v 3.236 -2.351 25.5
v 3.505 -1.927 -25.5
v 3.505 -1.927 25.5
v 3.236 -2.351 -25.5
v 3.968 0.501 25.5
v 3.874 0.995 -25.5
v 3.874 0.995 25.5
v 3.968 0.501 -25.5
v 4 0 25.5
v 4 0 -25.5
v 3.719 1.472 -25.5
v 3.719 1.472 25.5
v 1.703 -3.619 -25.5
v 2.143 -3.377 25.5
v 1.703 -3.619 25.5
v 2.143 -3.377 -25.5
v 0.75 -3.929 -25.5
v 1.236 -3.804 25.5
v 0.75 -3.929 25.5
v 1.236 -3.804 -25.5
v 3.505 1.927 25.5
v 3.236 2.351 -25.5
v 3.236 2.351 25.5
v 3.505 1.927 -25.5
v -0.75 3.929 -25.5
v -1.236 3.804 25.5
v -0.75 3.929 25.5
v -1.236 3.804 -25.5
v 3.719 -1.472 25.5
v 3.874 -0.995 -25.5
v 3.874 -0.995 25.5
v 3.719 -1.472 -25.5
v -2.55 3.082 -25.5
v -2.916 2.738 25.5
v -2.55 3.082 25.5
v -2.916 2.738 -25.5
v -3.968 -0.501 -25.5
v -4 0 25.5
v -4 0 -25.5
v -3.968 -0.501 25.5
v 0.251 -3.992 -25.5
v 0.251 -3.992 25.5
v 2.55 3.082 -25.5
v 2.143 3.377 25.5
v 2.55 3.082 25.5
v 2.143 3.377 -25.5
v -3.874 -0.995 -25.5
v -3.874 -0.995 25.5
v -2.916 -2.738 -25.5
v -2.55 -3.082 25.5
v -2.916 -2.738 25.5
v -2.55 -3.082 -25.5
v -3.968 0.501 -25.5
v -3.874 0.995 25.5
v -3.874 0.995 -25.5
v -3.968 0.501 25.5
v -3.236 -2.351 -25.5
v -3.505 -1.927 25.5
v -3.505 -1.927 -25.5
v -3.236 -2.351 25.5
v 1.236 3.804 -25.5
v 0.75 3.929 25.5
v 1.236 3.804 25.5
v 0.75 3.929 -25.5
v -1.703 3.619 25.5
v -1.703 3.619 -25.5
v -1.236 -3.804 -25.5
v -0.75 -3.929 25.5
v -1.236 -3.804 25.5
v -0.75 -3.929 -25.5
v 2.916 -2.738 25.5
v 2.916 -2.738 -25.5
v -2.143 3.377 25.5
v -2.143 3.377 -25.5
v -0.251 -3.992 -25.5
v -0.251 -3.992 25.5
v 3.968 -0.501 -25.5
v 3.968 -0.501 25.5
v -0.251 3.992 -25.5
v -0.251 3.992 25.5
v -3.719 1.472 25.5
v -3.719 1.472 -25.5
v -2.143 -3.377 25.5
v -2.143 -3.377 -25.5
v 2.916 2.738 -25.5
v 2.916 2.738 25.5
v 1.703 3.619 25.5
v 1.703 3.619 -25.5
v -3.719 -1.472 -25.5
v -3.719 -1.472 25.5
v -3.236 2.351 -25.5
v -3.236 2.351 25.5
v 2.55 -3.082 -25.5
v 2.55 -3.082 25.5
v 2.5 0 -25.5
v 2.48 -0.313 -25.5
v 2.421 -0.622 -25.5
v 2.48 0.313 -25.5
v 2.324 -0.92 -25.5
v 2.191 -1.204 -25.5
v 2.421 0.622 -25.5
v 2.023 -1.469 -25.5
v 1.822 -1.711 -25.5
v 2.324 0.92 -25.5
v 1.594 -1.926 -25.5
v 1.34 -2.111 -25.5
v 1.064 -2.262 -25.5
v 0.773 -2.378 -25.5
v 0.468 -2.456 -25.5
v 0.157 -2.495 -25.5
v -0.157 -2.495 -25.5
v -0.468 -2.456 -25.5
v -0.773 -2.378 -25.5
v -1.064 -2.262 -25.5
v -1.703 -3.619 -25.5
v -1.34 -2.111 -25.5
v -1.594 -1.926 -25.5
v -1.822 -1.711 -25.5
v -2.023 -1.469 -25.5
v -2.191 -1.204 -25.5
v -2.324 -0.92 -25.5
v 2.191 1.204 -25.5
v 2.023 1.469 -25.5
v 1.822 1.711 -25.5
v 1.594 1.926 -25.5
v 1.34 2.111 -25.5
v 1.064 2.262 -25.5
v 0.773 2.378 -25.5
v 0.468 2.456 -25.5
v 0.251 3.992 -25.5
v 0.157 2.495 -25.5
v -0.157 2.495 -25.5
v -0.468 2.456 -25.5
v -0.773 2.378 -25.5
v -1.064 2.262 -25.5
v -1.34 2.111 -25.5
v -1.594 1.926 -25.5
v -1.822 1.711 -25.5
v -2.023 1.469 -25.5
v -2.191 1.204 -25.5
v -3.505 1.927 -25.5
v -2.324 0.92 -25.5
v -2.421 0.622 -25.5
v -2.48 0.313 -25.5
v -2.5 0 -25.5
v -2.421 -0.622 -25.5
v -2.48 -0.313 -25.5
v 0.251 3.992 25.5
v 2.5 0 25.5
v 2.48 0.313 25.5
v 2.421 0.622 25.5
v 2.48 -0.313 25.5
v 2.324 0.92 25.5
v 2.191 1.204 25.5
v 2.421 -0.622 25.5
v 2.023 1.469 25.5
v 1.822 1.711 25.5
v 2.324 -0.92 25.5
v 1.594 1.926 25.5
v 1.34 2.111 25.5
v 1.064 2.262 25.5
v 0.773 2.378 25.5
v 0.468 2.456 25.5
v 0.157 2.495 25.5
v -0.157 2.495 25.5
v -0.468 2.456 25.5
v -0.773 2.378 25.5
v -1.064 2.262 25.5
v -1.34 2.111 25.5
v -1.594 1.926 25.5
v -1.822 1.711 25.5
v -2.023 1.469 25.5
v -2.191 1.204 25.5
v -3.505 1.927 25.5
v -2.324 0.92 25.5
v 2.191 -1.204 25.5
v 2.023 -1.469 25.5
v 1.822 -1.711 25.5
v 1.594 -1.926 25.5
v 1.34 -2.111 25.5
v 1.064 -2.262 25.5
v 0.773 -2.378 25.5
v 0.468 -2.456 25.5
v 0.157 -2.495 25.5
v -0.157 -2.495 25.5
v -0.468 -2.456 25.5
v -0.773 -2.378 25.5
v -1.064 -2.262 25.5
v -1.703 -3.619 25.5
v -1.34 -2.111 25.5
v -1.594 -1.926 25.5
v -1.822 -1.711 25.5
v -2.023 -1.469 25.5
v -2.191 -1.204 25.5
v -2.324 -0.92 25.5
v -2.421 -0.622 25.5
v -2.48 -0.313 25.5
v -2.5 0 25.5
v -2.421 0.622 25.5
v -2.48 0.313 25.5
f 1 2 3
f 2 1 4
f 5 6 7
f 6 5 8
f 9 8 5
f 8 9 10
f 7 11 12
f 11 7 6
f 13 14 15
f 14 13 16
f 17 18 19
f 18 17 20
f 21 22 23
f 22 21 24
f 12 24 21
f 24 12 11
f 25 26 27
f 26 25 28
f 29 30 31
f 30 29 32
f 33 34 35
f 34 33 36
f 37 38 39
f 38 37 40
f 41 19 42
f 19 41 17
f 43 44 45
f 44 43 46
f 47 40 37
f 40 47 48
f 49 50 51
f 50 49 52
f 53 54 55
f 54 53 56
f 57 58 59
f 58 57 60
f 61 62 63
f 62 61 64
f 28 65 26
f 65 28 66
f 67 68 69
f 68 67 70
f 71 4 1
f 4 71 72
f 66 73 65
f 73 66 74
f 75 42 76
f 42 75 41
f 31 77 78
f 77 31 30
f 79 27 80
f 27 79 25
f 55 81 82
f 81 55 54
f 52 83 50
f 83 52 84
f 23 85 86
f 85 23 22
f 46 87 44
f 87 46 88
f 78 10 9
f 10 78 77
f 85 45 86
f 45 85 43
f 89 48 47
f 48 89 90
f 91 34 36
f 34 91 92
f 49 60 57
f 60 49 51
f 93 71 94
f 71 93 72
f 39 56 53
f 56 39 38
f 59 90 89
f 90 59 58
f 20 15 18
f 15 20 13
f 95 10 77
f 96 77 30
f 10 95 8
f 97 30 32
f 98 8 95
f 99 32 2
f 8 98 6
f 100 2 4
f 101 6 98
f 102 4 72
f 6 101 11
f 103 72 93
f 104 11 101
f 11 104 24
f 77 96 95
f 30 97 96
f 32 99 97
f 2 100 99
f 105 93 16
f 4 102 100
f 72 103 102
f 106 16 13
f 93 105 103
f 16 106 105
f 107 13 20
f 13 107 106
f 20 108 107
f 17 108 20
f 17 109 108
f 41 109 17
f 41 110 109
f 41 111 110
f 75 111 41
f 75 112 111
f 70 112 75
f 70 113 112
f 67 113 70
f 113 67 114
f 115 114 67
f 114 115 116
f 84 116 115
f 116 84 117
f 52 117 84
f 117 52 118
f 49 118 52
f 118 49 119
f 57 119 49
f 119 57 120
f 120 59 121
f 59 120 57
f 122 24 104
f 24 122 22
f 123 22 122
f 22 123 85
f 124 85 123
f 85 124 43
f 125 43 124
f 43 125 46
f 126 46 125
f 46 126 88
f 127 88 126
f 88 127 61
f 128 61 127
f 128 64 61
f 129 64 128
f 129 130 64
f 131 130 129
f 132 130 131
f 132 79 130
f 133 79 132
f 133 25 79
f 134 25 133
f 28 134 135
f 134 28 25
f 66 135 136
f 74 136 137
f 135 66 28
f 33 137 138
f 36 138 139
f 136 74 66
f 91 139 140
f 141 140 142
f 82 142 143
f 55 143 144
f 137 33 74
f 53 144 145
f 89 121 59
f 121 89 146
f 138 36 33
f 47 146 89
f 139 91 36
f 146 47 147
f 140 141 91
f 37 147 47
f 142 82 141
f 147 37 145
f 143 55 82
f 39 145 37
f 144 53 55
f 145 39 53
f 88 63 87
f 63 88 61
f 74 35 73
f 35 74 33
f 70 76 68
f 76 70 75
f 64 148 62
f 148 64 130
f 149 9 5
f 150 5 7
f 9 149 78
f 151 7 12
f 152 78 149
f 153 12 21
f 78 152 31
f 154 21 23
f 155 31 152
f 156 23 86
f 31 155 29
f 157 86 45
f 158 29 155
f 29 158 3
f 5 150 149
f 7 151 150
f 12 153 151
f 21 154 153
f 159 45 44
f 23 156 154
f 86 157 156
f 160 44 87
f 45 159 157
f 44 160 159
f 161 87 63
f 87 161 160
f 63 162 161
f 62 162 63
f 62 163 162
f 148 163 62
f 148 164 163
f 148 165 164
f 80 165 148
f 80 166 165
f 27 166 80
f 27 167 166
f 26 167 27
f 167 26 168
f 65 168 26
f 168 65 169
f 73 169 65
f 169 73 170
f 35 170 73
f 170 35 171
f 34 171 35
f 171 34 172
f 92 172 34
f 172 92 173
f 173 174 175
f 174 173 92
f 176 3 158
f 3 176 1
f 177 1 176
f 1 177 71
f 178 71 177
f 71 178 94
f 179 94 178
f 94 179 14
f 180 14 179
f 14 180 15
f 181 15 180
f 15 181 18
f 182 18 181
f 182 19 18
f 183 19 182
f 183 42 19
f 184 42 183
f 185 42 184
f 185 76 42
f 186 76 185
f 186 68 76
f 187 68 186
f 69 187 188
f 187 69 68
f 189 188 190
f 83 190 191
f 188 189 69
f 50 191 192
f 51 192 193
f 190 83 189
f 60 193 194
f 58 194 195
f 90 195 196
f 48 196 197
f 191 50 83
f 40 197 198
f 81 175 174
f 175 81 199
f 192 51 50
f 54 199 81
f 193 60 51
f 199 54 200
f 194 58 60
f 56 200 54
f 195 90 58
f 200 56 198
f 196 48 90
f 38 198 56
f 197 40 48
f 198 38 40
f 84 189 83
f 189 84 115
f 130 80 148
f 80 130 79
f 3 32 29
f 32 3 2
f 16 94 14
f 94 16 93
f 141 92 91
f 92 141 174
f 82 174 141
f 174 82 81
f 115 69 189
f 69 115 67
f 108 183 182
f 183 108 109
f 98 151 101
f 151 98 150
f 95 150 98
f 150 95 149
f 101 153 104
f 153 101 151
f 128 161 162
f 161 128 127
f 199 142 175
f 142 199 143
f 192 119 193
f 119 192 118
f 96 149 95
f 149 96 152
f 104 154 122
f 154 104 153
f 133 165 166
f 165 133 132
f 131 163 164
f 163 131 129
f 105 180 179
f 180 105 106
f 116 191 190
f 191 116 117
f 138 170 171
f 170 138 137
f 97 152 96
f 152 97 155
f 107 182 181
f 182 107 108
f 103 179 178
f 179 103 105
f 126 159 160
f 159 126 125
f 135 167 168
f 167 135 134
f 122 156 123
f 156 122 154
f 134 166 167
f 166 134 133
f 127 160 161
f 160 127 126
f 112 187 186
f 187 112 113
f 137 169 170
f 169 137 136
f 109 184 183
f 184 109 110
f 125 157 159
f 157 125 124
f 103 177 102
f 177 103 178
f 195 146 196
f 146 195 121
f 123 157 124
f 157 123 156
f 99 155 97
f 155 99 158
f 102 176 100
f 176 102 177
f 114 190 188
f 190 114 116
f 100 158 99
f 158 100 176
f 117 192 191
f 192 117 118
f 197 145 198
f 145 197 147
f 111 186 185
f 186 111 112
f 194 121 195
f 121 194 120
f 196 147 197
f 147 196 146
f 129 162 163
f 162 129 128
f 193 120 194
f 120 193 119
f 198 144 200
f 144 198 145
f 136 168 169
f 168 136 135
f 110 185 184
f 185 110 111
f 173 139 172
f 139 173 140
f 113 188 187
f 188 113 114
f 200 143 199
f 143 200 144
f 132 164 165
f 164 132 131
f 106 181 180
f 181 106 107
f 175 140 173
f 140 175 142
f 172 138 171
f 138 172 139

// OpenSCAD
$fn = 50;


difference() {
	union() {
		translate(v = [0, 0, -25.5000000000]) {
			cylinder(h = 51, r = 4.0000000000);
		}
	}
	union() {
		translate(v = [0, 0, -100.0000000000]) {
			cylinder(h = 200, r = 2.5000000000);
		}
	}
}
